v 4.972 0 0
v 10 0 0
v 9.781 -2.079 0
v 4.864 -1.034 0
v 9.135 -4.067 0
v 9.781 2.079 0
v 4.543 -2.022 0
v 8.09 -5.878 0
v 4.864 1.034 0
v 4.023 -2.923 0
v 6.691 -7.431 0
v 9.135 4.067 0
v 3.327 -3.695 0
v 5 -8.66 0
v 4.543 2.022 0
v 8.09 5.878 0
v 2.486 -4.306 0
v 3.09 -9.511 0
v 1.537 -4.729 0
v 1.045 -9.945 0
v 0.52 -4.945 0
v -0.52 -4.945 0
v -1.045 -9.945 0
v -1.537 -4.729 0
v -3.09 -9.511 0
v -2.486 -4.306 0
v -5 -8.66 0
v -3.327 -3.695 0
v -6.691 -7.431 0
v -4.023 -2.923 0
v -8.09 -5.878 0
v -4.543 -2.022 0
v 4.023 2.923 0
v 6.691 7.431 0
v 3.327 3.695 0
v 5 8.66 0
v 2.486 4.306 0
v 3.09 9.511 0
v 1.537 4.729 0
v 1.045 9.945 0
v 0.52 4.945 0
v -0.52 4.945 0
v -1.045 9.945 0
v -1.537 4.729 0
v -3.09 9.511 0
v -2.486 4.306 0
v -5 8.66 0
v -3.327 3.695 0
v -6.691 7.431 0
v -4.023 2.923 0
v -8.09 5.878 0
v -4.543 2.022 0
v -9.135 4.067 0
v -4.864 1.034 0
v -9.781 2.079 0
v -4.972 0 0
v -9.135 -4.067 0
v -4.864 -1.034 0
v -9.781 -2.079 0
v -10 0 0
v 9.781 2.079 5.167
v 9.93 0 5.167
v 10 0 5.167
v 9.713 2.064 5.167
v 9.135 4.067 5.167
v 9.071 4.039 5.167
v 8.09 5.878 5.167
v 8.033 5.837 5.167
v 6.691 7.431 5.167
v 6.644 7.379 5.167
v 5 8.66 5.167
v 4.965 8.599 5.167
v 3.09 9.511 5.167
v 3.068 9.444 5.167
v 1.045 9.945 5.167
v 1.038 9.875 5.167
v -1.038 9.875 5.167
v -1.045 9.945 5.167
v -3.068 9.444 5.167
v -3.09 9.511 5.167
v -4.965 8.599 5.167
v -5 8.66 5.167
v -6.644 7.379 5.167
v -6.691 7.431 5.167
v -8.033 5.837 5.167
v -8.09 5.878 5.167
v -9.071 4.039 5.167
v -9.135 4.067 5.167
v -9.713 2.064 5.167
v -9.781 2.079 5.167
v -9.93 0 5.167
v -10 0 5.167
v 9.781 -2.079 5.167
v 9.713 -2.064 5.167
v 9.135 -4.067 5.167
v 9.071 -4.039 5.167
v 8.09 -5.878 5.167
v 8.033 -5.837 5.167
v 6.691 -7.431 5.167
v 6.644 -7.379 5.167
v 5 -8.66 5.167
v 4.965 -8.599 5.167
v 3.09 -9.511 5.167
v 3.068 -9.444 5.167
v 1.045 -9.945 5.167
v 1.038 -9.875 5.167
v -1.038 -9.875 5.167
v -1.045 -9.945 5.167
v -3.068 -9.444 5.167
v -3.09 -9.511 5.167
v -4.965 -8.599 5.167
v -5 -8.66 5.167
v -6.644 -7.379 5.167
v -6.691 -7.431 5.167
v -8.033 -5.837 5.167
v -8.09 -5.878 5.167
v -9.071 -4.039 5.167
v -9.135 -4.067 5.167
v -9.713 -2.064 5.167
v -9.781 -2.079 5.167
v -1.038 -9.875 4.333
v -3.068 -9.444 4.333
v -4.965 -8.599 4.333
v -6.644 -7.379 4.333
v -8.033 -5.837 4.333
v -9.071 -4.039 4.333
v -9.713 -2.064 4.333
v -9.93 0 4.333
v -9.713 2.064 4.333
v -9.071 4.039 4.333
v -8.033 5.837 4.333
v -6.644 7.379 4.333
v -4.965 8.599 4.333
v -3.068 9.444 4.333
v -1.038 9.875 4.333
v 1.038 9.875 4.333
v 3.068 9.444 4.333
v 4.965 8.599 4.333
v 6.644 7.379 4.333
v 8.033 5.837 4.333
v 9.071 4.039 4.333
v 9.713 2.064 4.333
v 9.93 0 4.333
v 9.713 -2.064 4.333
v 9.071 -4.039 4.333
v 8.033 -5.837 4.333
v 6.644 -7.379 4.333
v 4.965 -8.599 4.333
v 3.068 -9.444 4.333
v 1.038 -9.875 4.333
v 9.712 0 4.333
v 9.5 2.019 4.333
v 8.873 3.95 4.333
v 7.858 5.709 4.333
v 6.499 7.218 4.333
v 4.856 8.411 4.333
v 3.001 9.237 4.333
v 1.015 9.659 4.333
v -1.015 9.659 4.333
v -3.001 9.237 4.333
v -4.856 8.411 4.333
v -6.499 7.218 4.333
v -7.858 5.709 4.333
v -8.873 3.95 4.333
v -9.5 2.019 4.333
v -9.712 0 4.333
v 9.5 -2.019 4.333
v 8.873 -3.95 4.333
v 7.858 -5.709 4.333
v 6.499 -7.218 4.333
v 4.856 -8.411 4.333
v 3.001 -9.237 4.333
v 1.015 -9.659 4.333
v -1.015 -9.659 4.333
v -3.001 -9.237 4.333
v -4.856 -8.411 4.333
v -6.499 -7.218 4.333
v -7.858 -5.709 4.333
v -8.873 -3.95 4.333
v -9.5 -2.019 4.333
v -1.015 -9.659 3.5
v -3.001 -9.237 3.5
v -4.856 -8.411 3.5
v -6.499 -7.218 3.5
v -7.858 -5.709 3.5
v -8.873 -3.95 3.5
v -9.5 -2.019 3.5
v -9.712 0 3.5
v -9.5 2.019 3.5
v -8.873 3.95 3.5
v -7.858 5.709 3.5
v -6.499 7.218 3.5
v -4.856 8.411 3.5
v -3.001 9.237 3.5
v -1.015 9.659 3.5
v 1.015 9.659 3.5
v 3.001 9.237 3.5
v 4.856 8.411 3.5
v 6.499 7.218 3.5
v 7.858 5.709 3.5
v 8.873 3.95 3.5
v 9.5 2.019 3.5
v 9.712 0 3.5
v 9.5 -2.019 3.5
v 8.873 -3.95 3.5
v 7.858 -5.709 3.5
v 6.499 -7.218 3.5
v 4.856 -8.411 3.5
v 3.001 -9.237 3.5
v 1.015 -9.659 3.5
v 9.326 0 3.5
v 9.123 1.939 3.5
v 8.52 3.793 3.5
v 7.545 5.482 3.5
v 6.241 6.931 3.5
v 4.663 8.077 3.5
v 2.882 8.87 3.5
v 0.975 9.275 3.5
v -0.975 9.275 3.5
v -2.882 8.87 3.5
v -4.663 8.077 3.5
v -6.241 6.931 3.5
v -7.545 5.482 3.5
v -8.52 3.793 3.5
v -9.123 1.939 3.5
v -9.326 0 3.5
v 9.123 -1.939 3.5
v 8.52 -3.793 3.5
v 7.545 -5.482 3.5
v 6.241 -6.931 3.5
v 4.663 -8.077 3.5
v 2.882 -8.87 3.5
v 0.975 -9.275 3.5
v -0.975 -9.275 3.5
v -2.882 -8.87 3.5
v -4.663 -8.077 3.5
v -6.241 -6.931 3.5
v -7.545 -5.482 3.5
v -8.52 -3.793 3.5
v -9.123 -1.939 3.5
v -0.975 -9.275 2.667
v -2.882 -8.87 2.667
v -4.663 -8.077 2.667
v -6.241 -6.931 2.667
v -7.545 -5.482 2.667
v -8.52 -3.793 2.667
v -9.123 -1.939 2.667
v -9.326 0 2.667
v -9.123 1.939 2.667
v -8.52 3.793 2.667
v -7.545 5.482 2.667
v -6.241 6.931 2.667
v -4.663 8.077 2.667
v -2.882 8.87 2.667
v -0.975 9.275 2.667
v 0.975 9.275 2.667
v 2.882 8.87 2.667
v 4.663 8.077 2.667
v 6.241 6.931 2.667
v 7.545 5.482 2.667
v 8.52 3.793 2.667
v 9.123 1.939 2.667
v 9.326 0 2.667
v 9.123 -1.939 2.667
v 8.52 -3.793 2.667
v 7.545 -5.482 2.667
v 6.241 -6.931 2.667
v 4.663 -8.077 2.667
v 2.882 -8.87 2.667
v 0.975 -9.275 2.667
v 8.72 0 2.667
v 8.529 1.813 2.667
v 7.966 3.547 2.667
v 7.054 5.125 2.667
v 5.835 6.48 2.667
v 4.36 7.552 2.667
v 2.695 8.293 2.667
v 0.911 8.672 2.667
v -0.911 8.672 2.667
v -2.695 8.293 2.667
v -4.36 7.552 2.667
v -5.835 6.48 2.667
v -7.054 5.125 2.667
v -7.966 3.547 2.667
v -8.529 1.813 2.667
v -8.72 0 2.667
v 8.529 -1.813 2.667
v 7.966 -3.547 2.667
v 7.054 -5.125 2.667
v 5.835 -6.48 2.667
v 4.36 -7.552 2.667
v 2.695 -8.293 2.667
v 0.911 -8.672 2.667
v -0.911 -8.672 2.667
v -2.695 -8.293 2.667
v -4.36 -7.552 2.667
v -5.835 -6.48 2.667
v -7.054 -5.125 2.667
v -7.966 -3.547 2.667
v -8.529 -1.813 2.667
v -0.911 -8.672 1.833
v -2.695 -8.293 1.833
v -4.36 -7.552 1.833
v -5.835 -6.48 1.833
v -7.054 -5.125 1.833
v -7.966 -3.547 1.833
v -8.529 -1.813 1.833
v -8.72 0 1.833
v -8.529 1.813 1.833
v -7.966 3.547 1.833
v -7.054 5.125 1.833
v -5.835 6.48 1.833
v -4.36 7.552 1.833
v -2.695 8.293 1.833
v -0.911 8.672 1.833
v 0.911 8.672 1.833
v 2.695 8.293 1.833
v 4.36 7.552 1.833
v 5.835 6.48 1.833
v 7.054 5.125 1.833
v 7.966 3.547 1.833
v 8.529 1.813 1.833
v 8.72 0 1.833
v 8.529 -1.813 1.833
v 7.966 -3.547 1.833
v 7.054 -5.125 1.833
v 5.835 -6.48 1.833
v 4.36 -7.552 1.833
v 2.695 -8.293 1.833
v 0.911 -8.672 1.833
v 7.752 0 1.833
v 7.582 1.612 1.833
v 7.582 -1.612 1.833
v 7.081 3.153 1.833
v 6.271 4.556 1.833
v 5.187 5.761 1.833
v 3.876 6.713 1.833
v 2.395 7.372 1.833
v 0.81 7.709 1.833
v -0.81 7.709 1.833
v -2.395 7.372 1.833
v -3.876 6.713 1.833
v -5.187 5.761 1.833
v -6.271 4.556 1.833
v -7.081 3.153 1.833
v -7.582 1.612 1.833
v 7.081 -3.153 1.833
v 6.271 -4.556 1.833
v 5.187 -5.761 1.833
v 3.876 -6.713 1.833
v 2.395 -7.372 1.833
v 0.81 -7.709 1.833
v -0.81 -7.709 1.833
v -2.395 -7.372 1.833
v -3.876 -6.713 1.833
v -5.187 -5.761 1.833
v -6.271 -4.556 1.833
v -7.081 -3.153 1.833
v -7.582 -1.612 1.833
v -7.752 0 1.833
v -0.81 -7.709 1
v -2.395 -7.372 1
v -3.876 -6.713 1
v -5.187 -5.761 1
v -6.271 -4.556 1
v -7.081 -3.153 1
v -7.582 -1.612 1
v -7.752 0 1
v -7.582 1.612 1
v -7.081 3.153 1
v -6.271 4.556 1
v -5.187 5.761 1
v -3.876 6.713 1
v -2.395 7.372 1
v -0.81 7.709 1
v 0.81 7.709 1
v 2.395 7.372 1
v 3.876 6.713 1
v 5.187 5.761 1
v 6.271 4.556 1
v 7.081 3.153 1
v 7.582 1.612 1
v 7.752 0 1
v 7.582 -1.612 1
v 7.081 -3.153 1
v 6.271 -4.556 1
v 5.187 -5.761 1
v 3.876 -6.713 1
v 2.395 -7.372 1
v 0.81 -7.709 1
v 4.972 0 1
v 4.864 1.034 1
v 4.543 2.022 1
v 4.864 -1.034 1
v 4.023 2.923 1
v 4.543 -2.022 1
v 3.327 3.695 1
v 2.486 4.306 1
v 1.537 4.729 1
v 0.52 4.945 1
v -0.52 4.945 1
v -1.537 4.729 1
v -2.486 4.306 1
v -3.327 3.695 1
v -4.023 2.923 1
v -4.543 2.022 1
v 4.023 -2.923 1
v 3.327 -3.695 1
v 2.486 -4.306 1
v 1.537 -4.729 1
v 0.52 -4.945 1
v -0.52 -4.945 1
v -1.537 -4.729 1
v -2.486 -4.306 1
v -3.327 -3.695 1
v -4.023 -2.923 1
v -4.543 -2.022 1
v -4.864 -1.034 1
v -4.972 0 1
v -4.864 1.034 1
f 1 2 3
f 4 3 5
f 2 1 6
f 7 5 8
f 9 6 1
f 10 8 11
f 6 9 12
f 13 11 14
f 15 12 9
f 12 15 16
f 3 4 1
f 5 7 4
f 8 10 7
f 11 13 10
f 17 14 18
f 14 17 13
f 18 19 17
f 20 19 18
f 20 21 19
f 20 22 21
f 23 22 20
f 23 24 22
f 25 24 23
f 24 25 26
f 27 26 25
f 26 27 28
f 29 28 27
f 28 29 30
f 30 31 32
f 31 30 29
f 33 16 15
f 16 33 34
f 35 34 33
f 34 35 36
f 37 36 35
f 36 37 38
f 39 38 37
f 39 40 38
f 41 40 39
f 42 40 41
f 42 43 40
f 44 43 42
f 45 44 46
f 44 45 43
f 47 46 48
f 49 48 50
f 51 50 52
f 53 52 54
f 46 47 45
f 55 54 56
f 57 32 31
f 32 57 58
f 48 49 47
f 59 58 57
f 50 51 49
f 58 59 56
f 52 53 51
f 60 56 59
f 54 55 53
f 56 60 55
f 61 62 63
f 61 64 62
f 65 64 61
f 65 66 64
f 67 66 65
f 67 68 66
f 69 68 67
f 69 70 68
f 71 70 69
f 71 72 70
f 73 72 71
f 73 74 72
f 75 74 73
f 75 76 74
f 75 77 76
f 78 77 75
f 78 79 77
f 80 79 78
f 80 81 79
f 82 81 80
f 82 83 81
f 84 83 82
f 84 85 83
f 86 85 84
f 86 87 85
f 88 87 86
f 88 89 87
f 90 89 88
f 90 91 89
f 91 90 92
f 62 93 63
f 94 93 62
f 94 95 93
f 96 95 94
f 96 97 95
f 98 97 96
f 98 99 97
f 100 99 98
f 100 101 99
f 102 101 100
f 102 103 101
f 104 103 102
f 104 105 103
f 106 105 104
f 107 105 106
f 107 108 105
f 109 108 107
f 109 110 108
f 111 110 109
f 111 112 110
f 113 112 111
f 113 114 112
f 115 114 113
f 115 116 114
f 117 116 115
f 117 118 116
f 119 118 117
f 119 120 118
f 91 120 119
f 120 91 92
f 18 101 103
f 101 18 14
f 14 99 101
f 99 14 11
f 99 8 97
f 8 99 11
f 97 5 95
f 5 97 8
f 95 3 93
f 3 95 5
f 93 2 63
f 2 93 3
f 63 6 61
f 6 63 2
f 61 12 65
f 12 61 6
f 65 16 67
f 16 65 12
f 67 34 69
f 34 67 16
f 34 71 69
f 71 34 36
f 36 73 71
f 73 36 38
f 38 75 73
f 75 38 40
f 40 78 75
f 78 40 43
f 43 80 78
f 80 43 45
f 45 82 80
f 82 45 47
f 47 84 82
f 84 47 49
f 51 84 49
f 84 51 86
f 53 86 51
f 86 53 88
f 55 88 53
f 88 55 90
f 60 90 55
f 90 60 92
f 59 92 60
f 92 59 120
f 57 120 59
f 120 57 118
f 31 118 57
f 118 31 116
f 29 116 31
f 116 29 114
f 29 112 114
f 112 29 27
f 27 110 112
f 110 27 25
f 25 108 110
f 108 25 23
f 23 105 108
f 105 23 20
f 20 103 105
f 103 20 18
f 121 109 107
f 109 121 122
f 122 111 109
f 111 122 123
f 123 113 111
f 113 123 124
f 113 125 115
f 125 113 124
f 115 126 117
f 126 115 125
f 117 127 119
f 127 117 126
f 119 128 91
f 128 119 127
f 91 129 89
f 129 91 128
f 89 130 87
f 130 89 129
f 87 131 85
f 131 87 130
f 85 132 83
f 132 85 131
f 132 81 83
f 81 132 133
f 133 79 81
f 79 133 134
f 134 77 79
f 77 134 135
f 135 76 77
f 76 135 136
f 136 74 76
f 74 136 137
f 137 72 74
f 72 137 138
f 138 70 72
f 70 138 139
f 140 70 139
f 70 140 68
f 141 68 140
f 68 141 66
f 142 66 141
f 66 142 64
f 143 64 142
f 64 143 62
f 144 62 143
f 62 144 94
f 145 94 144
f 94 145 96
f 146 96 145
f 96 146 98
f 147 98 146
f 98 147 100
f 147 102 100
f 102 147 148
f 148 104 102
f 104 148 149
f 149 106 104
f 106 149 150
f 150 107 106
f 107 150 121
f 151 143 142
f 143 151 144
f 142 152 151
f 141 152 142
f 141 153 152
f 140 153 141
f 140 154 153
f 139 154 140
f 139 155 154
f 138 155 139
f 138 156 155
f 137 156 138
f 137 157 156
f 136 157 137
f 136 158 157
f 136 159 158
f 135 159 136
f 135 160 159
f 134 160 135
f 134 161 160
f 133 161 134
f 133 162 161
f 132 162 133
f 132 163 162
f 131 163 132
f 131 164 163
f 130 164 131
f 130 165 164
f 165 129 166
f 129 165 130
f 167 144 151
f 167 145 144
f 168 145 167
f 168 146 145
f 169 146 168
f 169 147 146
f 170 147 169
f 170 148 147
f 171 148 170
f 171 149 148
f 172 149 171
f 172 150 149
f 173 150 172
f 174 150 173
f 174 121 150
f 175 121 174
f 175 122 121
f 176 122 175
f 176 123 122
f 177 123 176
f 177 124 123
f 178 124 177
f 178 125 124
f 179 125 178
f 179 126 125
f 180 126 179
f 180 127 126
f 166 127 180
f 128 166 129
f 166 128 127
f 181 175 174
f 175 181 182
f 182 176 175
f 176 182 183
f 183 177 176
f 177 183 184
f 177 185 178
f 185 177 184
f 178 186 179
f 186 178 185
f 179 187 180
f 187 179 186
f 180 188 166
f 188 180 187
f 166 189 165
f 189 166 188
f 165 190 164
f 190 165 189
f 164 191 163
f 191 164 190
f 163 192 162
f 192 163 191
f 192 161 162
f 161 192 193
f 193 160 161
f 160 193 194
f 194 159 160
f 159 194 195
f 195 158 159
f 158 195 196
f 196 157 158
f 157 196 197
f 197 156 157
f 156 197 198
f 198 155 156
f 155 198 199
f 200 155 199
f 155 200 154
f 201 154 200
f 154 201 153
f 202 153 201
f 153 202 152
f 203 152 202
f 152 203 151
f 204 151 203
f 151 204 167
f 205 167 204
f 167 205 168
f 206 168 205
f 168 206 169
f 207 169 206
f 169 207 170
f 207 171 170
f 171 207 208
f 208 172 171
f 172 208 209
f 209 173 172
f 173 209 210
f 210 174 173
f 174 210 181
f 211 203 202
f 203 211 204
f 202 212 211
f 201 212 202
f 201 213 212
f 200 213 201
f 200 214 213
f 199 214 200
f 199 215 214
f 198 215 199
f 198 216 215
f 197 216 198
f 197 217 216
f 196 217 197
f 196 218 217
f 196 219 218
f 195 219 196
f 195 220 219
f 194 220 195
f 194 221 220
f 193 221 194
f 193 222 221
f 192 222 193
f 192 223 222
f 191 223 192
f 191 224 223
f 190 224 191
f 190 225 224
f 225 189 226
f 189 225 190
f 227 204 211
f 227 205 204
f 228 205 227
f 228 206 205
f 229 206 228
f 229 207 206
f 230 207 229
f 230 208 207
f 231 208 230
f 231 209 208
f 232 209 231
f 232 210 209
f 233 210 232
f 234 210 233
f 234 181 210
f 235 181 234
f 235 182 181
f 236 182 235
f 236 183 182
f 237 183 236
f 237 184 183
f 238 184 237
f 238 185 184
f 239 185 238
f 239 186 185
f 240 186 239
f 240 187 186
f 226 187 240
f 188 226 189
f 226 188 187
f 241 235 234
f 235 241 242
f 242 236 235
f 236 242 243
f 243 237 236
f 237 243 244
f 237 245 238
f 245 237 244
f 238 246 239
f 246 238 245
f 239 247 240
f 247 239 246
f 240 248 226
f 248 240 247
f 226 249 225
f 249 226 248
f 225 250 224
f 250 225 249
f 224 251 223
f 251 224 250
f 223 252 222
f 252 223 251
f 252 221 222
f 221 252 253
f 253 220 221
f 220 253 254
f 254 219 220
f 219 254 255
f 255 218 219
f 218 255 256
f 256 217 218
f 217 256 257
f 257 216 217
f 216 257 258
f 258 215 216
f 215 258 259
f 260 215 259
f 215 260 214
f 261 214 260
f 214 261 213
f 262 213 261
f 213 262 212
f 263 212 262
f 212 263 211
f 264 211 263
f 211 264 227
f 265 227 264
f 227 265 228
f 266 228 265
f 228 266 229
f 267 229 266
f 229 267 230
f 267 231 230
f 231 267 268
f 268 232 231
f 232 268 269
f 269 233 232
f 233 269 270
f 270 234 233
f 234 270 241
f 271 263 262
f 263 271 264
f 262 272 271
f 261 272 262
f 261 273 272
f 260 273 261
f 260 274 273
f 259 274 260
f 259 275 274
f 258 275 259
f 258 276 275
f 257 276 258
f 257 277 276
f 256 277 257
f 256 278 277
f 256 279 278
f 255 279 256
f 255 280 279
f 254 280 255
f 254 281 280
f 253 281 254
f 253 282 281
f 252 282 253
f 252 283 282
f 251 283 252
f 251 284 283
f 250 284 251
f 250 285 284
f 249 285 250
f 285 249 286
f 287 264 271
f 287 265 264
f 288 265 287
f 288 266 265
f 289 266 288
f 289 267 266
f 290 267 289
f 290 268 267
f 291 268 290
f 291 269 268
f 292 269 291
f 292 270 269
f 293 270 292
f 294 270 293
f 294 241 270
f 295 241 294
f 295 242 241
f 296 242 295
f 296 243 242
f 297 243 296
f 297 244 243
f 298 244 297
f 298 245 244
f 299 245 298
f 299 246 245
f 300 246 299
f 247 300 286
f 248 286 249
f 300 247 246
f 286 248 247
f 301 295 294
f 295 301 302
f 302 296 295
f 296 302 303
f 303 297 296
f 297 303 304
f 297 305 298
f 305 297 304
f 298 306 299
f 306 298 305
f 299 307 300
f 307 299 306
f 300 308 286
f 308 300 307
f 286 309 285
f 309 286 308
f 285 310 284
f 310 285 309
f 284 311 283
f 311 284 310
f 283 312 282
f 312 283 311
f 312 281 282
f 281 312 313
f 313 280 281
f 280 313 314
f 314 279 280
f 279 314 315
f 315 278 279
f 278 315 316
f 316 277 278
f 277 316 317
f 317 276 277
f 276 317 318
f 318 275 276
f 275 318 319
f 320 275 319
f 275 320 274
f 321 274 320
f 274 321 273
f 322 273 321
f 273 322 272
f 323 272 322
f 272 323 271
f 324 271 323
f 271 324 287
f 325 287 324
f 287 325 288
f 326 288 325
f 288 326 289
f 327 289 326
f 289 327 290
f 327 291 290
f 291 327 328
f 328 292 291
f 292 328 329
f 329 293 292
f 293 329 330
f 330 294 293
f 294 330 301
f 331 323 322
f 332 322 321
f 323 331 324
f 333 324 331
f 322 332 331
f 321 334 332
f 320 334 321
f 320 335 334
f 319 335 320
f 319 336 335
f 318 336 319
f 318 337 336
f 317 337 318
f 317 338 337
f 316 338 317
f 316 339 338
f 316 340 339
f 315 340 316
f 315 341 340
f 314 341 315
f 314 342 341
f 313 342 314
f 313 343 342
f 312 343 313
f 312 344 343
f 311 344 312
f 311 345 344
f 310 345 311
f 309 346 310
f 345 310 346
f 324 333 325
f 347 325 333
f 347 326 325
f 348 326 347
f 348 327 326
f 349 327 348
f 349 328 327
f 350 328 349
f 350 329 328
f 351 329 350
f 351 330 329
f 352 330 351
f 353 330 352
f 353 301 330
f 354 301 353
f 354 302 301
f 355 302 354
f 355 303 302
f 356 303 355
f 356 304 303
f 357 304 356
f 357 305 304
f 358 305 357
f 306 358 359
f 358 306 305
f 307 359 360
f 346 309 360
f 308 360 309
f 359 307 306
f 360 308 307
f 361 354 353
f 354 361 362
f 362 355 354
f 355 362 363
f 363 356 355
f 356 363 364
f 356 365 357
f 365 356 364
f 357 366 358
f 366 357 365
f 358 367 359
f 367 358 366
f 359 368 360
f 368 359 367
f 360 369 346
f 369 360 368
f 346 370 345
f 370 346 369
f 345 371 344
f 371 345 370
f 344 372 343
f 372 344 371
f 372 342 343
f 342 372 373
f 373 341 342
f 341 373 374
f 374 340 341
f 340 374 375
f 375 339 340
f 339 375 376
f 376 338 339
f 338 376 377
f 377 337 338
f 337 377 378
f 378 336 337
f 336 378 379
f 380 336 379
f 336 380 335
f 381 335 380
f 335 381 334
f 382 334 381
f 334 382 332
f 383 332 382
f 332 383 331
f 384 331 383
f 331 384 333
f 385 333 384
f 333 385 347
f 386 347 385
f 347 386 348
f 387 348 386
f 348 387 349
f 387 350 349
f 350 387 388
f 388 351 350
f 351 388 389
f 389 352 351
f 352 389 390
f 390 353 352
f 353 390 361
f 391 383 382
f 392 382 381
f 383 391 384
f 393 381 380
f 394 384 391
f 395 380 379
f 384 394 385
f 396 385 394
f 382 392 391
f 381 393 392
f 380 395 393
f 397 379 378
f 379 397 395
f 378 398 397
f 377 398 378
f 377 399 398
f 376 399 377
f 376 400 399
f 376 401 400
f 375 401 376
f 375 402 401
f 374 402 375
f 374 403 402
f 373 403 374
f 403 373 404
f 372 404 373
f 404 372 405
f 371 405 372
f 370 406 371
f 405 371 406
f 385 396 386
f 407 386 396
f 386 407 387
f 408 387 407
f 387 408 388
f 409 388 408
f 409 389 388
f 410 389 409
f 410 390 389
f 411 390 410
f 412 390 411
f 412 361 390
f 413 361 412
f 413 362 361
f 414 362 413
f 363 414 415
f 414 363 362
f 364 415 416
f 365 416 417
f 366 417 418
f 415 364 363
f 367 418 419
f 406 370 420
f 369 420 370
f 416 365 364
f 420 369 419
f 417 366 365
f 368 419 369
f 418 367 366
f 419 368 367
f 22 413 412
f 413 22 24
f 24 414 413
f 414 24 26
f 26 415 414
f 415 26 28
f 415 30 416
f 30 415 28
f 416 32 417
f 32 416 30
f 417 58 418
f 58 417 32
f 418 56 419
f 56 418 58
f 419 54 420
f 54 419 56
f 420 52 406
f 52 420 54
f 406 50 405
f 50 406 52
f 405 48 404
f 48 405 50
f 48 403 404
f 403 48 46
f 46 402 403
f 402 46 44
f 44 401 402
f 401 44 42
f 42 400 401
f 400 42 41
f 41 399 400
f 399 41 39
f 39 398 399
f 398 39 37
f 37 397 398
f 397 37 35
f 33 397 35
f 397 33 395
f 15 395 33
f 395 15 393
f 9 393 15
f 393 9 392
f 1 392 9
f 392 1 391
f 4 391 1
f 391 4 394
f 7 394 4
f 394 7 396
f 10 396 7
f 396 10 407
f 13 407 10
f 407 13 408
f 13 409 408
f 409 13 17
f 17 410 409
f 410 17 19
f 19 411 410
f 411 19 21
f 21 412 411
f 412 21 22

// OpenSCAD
union() {
    union() {
        linear_extrude(height=5.166666666666667) {
            difference() {
                offset(r=0) {
                    circle(r=10);
                };
                offset(r=-0.06993351408365323) {
                    circle(r=10);
                };
            };
        };
        linear_extrude(height=4.333333333333333) {
            difference() {
                offset(r=-0.06993351408365323) {
                    circle(r=10);
                };
                offset(r=-0.2859547920896832) {
                    circle(r=10);
                };
            };
        };
        linear_extrude(height=3.5) {
            difference() {
                offset(r=-0.2859547920896832) {
                    circle(r=10);
                };
                offset(r=-0.669872981077807) {
                    circle(r=10);
                };
            };
        };
        linear_extrude(height=2.6666666666666665) {
            difference() {
                offset(r=-0.669872981077807) {
                    circle(r=10);
                };
                offset(r=-1.2732200375003506) {
                    circle(r=10);
                };
            };
        };
        linear_extrude(height=1.833333333333333) {
            difference() {
                offset(r=-1.2732200375003506) {
                    circle(r=10);
                };
                offset(r=-2.236146008037167) {
                    circle(r=10);
                };
            };
        };
        linear_extrude(height=1) {
            difference() {
                offset(r=-2.236146008037167) {
                    circle(r=10);
                };
                offset(r=-5) {
                    circle(r=10);
                };
            };
        };
    };
    %difference() {
        translate(v=[0, 0, 2.5]) {
            cube(size=[25, 25, 5], center=true);
        };
        cylinder(r=10, h=20, center=true);
    };
};
